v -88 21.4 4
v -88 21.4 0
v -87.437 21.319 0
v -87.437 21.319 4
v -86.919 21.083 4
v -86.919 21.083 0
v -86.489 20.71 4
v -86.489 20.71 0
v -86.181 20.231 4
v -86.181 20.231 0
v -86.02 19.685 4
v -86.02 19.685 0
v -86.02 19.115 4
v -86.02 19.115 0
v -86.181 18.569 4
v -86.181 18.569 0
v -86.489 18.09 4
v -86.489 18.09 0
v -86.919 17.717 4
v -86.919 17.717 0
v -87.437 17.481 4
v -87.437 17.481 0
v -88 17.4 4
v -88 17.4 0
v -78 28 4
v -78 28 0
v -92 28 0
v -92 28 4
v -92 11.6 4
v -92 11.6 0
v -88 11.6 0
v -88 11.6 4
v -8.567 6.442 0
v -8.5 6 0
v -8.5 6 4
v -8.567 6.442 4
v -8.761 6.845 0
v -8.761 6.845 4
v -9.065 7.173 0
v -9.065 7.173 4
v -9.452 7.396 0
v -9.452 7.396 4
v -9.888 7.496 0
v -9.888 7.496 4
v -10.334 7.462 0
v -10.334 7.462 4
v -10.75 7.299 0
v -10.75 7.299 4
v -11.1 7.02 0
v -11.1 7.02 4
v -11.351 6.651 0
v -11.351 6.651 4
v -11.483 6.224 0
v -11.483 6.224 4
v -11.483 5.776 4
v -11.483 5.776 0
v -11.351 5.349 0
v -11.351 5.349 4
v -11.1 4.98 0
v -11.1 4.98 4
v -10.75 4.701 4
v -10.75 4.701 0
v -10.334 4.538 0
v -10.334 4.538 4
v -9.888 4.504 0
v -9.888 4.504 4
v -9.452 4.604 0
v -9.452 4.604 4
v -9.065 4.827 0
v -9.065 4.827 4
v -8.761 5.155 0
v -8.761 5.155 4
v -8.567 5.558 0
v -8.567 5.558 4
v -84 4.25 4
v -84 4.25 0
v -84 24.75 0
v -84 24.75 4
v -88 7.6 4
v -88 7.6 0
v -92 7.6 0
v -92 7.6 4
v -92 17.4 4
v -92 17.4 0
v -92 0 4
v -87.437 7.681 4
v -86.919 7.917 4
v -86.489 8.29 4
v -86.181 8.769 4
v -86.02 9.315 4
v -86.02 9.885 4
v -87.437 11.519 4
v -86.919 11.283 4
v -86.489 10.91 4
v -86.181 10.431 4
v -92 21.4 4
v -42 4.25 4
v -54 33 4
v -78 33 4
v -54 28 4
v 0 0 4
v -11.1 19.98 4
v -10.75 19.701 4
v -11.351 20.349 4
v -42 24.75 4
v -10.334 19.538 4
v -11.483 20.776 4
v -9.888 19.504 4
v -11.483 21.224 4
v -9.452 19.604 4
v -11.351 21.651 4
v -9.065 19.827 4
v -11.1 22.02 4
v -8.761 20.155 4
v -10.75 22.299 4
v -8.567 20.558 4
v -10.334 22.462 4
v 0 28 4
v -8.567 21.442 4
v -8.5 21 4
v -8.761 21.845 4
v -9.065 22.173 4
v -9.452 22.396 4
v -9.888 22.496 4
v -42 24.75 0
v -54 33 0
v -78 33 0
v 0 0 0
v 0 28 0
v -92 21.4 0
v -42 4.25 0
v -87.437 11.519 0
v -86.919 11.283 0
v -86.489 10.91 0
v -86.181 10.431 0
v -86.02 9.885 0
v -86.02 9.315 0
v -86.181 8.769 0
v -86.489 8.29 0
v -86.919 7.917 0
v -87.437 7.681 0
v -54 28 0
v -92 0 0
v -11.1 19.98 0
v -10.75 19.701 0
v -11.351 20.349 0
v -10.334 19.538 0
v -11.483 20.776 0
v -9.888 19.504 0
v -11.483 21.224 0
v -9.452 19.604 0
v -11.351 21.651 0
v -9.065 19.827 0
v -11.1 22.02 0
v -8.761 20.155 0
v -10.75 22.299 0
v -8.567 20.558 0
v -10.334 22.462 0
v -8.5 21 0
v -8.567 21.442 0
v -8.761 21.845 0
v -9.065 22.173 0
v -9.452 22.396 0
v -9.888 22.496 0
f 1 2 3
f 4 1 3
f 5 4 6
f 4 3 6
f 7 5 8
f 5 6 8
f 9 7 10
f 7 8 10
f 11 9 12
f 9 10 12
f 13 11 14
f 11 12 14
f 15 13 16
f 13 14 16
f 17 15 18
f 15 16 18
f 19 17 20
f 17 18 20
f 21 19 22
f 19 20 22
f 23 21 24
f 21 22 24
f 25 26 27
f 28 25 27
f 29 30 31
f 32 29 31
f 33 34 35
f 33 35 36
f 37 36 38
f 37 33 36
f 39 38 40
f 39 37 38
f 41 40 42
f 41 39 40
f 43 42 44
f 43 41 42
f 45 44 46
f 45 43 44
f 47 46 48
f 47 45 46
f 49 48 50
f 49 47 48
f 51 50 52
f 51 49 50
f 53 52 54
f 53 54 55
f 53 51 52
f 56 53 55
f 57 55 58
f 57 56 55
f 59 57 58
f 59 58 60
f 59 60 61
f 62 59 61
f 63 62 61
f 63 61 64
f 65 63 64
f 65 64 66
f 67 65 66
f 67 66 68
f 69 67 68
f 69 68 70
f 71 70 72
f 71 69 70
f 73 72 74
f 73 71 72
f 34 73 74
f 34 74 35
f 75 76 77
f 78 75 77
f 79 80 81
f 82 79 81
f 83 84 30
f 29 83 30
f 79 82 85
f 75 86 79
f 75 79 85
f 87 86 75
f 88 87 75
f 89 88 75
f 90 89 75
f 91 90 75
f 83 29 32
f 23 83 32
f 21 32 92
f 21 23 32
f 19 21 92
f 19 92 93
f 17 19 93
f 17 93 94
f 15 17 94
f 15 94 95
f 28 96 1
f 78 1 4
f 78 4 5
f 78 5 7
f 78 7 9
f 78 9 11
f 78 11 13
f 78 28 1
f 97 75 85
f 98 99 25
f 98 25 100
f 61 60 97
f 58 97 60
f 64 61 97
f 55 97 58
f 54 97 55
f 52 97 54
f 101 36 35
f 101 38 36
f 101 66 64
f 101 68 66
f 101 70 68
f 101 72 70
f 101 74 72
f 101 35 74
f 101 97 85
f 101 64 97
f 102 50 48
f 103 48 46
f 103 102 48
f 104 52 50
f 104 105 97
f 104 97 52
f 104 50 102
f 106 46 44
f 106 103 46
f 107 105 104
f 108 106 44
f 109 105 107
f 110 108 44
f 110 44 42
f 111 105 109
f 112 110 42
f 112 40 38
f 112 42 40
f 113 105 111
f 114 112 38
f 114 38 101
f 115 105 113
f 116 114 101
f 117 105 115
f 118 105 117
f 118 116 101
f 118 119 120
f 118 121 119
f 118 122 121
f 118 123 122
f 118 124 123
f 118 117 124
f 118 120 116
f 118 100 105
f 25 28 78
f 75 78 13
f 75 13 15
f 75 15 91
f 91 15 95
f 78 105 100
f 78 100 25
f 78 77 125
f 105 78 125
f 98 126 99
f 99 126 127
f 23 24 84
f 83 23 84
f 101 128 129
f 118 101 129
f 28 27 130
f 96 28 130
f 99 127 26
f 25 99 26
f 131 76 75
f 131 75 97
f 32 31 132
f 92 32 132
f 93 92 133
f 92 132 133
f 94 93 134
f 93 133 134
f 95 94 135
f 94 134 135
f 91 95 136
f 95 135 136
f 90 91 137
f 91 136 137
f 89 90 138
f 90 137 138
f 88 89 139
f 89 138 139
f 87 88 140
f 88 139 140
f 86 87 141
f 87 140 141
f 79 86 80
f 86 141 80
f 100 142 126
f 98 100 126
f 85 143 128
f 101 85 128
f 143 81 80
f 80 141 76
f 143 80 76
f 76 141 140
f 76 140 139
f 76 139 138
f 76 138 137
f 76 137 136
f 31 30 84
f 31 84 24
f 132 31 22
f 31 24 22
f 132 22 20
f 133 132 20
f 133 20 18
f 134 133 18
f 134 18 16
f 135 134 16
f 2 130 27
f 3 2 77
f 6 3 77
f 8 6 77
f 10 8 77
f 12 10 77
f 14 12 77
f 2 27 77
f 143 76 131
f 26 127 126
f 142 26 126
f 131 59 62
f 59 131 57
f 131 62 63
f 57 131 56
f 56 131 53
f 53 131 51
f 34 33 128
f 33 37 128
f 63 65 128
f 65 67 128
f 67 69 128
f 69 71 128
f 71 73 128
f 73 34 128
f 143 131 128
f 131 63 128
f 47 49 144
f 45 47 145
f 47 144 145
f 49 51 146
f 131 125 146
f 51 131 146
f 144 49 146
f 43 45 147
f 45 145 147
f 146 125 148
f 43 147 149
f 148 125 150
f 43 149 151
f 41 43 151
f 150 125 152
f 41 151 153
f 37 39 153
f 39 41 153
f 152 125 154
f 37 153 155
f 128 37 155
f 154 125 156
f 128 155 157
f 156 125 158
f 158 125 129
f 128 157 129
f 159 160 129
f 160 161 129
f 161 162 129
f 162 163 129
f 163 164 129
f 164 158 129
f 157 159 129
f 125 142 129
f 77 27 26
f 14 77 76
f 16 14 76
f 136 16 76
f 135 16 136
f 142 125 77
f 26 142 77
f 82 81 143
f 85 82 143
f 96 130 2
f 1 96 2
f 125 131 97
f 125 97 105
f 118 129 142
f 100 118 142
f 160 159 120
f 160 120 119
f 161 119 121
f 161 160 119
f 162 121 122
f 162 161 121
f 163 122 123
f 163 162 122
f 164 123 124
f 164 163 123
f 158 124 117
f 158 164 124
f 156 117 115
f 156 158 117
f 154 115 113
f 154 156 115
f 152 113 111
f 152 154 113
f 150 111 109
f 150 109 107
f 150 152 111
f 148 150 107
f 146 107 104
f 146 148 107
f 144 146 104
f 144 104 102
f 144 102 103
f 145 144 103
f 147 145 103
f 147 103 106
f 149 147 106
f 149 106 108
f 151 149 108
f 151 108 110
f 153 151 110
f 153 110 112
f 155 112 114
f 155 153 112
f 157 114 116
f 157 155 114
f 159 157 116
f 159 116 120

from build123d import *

# Parameters (mm, degrees)
SKETCH1_R           = 1.5
SKETCH1_W           = 42
SKETCH1_H           = 20.5
BOSS_EXTRUDE1_DEPTH = 4


with BuildPart() as part:
    # Sketch1 → Boss-Extrude1 (new body)
    with BuildSketch(Plane.XY):
        with BuildLine():
            Line((0, 0), (0, 28))
            Line((0, 28), (-54, 28))
            Line((-54, 28), (-54, 33))
            Line((-54, 33), (-78, 33))
            Line((-78, 33), (-78, 28))
            Line((-78, 28), (-92, 28))
            Line((-92, 28), (-92, 21.4))
            Line((-92, 21.4), (-88, 21.4))
            ThreePointArc((-88, 21.4), (-86, 19.4), (-88, 17.4))
            Line((-88, 17.4), (-92, 17.4))
            Line((-92, 17.4), (-92, 11.6))
            Line((-92, 11.6), (-88, 11.6))
            ThreePointArc((-88, 11.6), (-86, 9.6), (-88, 7.6))
            Line((-88, 7.6), (-92, 7.6))
            Line((-92, 7.6), (-92, 0))
            Line((-92, 0), (0, 0))
        make_face()
        with Locations((-10, 21)):
            Circle(SKETCH1_R, mode=Mode.SUBTRACT)
        with Locations((-10, 6)):
            Circle(SKETCH1_R, mode=Mode.SUBTRACT)
        with Locations((-63, 14.5)):
            Rectangle(SKETCH1_W, SKETCH1_H, mode=Mode.SUBTRACT)
    extrude(amount=BOSS_EXTRUDE1_DEPTH)


solid = part.part
